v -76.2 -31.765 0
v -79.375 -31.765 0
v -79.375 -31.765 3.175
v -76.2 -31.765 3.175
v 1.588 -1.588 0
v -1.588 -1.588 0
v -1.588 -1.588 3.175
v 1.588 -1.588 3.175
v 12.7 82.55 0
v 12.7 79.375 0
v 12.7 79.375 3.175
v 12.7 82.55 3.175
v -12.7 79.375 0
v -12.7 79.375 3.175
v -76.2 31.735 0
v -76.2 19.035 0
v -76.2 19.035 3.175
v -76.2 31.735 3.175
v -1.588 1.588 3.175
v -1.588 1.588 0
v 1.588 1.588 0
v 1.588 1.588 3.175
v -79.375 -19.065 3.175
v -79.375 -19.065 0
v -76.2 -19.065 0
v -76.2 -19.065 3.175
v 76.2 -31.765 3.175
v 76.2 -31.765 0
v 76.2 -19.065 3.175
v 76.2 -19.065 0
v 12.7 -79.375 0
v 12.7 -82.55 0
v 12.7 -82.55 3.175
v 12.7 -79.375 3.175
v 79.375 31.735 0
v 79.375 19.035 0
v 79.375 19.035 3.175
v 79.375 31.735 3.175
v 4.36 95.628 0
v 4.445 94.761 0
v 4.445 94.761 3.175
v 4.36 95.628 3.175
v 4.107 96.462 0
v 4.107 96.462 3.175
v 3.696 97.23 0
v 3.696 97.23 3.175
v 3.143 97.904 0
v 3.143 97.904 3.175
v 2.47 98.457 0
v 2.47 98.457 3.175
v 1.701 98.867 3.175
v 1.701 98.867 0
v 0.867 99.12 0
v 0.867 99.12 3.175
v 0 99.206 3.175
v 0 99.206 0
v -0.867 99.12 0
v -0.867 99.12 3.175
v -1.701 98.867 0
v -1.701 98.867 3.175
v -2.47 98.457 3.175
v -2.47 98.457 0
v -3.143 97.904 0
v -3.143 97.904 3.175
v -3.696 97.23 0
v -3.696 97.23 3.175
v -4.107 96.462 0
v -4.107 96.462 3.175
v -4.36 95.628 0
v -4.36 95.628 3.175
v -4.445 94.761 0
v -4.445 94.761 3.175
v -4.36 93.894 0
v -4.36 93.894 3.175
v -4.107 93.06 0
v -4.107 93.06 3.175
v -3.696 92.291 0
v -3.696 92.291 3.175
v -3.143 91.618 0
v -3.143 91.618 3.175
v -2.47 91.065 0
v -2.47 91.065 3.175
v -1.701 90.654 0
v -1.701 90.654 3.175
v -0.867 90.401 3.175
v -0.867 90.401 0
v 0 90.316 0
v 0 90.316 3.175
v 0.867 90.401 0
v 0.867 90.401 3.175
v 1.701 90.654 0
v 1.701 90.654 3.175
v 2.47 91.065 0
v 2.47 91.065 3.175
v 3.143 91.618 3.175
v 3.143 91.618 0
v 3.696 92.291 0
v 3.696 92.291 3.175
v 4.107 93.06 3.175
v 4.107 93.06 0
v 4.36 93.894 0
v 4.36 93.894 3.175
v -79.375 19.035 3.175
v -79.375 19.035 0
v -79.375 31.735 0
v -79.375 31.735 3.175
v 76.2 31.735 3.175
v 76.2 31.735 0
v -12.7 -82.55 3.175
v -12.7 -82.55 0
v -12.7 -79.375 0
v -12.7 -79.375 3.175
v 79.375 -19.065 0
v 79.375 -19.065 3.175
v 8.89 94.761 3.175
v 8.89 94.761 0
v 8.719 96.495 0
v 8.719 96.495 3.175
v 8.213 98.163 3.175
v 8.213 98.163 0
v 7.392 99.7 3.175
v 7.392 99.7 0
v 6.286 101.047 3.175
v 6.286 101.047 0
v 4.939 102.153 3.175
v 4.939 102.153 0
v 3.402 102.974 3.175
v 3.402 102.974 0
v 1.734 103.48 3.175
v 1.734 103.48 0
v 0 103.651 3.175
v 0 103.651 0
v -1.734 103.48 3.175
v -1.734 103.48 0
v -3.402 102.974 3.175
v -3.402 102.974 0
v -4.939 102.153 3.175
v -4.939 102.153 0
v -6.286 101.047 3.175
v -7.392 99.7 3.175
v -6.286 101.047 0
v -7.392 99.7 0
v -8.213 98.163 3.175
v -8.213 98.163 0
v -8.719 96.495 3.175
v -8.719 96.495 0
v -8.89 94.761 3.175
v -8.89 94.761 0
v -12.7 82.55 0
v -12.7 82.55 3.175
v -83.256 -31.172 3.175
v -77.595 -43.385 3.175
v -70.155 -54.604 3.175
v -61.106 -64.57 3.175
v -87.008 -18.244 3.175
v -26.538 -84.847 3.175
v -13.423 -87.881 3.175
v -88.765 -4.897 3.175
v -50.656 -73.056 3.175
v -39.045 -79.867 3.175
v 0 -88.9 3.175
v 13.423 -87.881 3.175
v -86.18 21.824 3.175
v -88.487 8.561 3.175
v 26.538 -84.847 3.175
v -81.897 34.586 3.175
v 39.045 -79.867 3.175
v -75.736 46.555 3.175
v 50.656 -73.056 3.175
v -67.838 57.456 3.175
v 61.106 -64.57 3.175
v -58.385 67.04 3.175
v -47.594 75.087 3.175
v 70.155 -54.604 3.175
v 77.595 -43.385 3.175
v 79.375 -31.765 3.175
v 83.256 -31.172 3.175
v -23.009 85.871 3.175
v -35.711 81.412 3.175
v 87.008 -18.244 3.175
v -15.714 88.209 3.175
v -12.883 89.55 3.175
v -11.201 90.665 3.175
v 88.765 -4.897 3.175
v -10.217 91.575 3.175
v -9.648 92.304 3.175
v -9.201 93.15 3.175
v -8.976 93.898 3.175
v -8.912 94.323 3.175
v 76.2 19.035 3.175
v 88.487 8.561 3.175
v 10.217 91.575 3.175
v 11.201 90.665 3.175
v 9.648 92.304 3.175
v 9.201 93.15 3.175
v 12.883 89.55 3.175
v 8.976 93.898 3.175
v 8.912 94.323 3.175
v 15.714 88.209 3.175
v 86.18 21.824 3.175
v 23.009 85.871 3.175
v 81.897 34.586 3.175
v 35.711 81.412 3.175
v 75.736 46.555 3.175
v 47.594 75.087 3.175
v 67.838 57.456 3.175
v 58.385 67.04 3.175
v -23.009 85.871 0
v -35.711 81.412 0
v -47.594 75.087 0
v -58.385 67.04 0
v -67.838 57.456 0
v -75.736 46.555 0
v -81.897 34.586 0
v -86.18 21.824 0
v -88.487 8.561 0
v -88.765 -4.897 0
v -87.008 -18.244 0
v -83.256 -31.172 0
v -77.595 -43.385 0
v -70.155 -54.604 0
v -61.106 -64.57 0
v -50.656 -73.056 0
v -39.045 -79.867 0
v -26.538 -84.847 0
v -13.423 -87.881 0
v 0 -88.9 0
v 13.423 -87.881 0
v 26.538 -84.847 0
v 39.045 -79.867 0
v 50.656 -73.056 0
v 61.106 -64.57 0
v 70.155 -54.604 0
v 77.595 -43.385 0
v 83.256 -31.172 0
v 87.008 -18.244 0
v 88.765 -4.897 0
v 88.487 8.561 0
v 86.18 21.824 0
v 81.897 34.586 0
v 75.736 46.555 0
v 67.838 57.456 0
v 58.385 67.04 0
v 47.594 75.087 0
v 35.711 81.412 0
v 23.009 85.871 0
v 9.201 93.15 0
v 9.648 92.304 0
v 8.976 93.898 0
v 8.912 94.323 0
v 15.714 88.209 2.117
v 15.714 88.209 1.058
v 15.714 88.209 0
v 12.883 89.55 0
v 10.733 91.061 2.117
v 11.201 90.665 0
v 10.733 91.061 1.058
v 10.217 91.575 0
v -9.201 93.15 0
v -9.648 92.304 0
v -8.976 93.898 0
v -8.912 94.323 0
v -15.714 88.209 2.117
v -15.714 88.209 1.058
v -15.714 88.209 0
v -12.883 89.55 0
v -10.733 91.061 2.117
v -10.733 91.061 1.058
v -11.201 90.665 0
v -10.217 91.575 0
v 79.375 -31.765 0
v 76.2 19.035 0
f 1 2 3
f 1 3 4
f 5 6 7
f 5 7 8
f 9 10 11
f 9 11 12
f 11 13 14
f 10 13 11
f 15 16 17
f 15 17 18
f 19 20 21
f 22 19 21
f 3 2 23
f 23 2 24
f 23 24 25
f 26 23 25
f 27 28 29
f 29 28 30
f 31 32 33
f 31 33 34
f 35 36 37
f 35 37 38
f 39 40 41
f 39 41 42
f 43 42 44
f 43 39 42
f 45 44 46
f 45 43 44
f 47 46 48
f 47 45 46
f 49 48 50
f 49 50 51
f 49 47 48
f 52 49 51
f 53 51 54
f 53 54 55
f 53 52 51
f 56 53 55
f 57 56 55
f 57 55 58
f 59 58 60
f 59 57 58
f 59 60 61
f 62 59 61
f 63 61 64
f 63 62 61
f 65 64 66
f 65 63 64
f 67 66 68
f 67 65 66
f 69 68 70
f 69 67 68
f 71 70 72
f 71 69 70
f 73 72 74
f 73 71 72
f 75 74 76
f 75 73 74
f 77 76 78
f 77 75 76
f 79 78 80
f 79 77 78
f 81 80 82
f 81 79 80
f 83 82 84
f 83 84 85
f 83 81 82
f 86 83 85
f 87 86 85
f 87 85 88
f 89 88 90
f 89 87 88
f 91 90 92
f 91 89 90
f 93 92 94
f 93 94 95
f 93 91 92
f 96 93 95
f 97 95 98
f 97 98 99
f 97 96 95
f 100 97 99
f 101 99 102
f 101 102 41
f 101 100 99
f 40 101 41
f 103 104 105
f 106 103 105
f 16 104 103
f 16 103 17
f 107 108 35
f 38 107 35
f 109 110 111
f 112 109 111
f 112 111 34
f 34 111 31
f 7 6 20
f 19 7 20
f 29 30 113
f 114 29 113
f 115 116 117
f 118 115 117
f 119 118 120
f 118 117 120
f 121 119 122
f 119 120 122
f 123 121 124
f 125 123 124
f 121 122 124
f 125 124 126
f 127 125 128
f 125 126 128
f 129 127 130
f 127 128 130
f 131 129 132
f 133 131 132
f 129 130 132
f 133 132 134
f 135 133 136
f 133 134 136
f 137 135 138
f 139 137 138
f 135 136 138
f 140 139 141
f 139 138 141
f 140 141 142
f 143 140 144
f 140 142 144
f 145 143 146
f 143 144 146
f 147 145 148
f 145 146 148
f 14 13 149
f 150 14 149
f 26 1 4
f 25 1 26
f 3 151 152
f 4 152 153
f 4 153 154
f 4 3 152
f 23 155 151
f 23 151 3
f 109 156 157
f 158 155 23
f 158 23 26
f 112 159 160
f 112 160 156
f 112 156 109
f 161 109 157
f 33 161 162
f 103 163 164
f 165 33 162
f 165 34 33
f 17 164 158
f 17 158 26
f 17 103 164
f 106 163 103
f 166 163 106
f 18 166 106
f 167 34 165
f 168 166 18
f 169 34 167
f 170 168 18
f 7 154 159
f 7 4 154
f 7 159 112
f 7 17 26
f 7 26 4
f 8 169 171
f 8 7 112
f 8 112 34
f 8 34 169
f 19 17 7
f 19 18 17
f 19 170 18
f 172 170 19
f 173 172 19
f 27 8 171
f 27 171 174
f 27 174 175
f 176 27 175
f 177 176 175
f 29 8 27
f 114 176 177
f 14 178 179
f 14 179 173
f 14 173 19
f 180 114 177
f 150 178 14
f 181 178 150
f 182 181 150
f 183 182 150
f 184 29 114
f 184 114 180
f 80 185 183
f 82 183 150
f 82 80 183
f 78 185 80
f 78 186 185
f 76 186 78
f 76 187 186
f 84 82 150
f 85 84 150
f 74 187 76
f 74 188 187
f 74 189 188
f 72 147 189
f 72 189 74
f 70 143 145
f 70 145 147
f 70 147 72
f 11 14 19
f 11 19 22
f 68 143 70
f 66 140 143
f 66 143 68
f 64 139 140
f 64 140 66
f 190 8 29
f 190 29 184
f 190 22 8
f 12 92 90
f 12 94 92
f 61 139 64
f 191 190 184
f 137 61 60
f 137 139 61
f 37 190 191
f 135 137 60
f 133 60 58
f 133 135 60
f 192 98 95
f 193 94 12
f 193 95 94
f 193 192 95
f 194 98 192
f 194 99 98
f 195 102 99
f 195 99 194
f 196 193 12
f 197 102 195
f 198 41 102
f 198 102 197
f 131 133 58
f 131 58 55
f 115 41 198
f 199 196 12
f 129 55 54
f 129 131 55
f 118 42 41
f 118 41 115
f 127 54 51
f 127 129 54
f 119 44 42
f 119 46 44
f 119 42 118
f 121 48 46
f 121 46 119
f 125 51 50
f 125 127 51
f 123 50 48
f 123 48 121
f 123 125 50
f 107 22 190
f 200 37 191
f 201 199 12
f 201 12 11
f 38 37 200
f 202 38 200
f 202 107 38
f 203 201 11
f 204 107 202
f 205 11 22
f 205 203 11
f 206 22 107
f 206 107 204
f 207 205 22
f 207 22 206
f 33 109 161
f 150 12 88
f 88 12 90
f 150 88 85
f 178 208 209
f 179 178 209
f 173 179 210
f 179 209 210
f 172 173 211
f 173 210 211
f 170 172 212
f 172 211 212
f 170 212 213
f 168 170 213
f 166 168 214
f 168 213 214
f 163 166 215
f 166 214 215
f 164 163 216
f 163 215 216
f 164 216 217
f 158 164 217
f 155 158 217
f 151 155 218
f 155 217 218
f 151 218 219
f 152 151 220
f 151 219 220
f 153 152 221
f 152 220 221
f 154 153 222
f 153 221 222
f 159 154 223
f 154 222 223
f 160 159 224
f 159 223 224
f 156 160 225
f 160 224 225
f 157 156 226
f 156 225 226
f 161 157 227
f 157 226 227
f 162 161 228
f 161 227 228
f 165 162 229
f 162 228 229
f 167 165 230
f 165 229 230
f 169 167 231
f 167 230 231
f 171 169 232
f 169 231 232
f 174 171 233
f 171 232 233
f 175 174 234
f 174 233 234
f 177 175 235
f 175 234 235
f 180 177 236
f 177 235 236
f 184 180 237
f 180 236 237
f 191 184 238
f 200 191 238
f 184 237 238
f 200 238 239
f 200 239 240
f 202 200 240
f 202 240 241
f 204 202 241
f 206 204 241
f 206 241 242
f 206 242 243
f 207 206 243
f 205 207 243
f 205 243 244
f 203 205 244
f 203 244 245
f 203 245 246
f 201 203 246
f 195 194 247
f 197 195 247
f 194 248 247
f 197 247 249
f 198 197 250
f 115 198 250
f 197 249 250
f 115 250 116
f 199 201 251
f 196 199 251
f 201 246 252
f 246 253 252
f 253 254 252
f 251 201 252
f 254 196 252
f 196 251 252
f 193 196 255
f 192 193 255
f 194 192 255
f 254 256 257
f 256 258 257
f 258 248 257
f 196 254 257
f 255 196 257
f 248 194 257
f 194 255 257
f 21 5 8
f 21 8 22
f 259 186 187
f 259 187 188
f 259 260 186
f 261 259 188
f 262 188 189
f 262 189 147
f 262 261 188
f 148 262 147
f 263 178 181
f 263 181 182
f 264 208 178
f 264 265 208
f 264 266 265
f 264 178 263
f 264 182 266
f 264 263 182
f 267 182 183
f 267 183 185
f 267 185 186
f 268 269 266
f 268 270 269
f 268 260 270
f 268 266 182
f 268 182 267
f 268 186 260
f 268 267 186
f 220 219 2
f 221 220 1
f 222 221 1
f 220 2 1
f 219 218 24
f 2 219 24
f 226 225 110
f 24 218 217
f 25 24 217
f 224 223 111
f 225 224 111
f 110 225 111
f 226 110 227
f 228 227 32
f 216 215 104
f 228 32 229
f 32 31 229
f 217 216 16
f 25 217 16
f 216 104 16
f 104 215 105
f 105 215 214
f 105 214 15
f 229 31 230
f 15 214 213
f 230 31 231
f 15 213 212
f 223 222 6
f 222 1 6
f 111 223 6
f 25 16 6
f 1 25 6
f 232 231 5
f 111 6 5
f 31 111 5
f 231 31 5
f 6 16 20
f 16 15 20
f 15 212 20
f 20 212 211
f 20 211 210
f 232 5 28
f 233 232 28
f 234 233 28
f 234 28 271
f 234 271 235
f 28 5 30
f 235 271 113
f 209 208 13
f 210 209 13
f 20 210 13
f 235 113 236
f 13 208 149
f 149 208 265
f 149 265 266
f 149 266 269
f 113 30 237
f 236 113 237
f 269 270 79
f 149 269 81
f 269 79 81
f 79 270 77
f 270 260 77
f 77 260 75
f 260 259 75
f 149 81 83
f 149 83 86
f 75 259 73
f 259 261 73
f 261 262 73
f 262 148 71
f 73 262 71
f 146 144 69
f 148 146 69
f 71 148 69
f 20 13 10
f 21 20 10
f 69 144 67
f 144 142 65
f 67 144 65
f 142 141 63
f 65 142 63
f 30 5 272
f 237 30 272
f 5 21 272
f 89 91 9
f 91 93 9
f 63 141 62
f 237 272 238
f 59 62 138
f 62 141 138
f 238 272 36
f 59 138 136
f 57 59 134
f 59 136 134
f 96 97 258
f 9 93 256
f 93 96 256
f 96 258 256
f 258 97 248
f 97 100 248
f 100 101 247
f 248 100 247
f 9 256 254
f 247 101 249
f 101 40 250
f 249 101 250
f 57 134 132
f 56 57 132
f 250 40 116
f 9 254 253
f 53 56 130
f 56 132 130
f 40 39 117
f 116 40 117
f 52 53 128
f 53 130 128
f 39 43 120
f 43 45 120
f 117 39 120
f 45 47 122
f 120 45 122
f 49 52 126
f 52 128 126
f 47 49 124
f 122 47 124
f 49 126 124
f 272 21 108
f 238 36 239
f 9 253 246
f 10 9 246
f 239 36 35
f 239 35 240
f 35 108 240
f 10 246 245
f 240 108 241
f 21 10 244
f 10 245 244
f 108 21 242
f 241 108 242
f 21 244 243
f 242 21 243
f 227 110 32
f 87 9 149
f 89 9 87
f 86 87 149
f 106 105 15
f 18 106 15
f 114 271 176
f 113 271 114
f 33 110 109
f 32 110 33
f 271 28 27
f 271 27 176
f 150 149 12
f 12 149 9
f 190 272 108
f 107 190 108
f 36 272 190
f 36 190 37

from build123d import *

# Parameters (mm, degrees)
SKETCH1_R           = 4.445
SKETCH1_W           = 3.175
SKETCH1_H           = 12.7
SKETCH1_H_2         = 3.175
SKETCH1_W_2         = 25.4
BOSS_EXTRUDE1_DEPTH = 3.175


with BuildPart() as part:
    # Sketch1 → Boss-Extrude1 (new body)
    with BuildSketch(Plane.XY):
        with BuildLine():
            ThreePointArc((-23.00901311, 85.870805957), (0, -88.9), (23.00901311, 85.870805957))
            add(Edge.make_bspline(
                [(23.00901311, 85.870805957), (14.830841114, 88.062140539), (8.89, 90.527472624), (8.89, 94.760805957)],
                knots=[0, 0, 0, 0, 1, 1, 1, 1], degree=3))
            ThreePointArc((8.89, 94.760805957), (0, 103.650805957), (-8.89, 94.760805957))
            add(Edge.make_bspline(
                [(-23.00901311, 85.870805957), (-14.830841114, 88.062140539), (-8.89, 90.527472624), (-8.89, 94.760805957)],
                knots=[0, 0, 0, 0, 1, 1, 1, 1], degree=3))
        make_face()
        with Locations((0, 94.760805957)):
            Circle(SKETCH1_R, mode=Mode.SUBTRACT)
        with Locations((77.7875, 25.38476)):
            Rectangle(SKETCH1_W, SKETCH1_H, mode=Mode.SUBTRACT)
        Rectangle(SKETCH1_W, SKETCH1_H_2, mode=Mode.SUBTRACT)
        with Locations((77.7875, -25.41524)):
            Rectangle(SKETCH1_W, SKETCH1_H, mode=Mode.SUBTRACT)
        with Locations((-77.7875, -25.41524)):
            Rectangle(SKETCH1_W, SKETCH1_H, mode=Mode.SUBTRACT)
        with Locations((-77.7875, 25.38476)):
            Rectangle(SKETCH1_W, SKETCH1_H, mode=Mode.SUBTRACT)
        with Locations((0, 80.9625)):
            Rectangle(SKETCH1_W_2, SKETCH1_H_2, mode=Mode.SUBTRACT)
        with Locations((0, -80.9625)):
            Rectangle(SKETCH1_W_2, SKETCH1_H_2, mode=Mode.SUBTRACT)
    extrude(amount=BOSS_EXTRUDE1_DEPTH)


solid = part.part
